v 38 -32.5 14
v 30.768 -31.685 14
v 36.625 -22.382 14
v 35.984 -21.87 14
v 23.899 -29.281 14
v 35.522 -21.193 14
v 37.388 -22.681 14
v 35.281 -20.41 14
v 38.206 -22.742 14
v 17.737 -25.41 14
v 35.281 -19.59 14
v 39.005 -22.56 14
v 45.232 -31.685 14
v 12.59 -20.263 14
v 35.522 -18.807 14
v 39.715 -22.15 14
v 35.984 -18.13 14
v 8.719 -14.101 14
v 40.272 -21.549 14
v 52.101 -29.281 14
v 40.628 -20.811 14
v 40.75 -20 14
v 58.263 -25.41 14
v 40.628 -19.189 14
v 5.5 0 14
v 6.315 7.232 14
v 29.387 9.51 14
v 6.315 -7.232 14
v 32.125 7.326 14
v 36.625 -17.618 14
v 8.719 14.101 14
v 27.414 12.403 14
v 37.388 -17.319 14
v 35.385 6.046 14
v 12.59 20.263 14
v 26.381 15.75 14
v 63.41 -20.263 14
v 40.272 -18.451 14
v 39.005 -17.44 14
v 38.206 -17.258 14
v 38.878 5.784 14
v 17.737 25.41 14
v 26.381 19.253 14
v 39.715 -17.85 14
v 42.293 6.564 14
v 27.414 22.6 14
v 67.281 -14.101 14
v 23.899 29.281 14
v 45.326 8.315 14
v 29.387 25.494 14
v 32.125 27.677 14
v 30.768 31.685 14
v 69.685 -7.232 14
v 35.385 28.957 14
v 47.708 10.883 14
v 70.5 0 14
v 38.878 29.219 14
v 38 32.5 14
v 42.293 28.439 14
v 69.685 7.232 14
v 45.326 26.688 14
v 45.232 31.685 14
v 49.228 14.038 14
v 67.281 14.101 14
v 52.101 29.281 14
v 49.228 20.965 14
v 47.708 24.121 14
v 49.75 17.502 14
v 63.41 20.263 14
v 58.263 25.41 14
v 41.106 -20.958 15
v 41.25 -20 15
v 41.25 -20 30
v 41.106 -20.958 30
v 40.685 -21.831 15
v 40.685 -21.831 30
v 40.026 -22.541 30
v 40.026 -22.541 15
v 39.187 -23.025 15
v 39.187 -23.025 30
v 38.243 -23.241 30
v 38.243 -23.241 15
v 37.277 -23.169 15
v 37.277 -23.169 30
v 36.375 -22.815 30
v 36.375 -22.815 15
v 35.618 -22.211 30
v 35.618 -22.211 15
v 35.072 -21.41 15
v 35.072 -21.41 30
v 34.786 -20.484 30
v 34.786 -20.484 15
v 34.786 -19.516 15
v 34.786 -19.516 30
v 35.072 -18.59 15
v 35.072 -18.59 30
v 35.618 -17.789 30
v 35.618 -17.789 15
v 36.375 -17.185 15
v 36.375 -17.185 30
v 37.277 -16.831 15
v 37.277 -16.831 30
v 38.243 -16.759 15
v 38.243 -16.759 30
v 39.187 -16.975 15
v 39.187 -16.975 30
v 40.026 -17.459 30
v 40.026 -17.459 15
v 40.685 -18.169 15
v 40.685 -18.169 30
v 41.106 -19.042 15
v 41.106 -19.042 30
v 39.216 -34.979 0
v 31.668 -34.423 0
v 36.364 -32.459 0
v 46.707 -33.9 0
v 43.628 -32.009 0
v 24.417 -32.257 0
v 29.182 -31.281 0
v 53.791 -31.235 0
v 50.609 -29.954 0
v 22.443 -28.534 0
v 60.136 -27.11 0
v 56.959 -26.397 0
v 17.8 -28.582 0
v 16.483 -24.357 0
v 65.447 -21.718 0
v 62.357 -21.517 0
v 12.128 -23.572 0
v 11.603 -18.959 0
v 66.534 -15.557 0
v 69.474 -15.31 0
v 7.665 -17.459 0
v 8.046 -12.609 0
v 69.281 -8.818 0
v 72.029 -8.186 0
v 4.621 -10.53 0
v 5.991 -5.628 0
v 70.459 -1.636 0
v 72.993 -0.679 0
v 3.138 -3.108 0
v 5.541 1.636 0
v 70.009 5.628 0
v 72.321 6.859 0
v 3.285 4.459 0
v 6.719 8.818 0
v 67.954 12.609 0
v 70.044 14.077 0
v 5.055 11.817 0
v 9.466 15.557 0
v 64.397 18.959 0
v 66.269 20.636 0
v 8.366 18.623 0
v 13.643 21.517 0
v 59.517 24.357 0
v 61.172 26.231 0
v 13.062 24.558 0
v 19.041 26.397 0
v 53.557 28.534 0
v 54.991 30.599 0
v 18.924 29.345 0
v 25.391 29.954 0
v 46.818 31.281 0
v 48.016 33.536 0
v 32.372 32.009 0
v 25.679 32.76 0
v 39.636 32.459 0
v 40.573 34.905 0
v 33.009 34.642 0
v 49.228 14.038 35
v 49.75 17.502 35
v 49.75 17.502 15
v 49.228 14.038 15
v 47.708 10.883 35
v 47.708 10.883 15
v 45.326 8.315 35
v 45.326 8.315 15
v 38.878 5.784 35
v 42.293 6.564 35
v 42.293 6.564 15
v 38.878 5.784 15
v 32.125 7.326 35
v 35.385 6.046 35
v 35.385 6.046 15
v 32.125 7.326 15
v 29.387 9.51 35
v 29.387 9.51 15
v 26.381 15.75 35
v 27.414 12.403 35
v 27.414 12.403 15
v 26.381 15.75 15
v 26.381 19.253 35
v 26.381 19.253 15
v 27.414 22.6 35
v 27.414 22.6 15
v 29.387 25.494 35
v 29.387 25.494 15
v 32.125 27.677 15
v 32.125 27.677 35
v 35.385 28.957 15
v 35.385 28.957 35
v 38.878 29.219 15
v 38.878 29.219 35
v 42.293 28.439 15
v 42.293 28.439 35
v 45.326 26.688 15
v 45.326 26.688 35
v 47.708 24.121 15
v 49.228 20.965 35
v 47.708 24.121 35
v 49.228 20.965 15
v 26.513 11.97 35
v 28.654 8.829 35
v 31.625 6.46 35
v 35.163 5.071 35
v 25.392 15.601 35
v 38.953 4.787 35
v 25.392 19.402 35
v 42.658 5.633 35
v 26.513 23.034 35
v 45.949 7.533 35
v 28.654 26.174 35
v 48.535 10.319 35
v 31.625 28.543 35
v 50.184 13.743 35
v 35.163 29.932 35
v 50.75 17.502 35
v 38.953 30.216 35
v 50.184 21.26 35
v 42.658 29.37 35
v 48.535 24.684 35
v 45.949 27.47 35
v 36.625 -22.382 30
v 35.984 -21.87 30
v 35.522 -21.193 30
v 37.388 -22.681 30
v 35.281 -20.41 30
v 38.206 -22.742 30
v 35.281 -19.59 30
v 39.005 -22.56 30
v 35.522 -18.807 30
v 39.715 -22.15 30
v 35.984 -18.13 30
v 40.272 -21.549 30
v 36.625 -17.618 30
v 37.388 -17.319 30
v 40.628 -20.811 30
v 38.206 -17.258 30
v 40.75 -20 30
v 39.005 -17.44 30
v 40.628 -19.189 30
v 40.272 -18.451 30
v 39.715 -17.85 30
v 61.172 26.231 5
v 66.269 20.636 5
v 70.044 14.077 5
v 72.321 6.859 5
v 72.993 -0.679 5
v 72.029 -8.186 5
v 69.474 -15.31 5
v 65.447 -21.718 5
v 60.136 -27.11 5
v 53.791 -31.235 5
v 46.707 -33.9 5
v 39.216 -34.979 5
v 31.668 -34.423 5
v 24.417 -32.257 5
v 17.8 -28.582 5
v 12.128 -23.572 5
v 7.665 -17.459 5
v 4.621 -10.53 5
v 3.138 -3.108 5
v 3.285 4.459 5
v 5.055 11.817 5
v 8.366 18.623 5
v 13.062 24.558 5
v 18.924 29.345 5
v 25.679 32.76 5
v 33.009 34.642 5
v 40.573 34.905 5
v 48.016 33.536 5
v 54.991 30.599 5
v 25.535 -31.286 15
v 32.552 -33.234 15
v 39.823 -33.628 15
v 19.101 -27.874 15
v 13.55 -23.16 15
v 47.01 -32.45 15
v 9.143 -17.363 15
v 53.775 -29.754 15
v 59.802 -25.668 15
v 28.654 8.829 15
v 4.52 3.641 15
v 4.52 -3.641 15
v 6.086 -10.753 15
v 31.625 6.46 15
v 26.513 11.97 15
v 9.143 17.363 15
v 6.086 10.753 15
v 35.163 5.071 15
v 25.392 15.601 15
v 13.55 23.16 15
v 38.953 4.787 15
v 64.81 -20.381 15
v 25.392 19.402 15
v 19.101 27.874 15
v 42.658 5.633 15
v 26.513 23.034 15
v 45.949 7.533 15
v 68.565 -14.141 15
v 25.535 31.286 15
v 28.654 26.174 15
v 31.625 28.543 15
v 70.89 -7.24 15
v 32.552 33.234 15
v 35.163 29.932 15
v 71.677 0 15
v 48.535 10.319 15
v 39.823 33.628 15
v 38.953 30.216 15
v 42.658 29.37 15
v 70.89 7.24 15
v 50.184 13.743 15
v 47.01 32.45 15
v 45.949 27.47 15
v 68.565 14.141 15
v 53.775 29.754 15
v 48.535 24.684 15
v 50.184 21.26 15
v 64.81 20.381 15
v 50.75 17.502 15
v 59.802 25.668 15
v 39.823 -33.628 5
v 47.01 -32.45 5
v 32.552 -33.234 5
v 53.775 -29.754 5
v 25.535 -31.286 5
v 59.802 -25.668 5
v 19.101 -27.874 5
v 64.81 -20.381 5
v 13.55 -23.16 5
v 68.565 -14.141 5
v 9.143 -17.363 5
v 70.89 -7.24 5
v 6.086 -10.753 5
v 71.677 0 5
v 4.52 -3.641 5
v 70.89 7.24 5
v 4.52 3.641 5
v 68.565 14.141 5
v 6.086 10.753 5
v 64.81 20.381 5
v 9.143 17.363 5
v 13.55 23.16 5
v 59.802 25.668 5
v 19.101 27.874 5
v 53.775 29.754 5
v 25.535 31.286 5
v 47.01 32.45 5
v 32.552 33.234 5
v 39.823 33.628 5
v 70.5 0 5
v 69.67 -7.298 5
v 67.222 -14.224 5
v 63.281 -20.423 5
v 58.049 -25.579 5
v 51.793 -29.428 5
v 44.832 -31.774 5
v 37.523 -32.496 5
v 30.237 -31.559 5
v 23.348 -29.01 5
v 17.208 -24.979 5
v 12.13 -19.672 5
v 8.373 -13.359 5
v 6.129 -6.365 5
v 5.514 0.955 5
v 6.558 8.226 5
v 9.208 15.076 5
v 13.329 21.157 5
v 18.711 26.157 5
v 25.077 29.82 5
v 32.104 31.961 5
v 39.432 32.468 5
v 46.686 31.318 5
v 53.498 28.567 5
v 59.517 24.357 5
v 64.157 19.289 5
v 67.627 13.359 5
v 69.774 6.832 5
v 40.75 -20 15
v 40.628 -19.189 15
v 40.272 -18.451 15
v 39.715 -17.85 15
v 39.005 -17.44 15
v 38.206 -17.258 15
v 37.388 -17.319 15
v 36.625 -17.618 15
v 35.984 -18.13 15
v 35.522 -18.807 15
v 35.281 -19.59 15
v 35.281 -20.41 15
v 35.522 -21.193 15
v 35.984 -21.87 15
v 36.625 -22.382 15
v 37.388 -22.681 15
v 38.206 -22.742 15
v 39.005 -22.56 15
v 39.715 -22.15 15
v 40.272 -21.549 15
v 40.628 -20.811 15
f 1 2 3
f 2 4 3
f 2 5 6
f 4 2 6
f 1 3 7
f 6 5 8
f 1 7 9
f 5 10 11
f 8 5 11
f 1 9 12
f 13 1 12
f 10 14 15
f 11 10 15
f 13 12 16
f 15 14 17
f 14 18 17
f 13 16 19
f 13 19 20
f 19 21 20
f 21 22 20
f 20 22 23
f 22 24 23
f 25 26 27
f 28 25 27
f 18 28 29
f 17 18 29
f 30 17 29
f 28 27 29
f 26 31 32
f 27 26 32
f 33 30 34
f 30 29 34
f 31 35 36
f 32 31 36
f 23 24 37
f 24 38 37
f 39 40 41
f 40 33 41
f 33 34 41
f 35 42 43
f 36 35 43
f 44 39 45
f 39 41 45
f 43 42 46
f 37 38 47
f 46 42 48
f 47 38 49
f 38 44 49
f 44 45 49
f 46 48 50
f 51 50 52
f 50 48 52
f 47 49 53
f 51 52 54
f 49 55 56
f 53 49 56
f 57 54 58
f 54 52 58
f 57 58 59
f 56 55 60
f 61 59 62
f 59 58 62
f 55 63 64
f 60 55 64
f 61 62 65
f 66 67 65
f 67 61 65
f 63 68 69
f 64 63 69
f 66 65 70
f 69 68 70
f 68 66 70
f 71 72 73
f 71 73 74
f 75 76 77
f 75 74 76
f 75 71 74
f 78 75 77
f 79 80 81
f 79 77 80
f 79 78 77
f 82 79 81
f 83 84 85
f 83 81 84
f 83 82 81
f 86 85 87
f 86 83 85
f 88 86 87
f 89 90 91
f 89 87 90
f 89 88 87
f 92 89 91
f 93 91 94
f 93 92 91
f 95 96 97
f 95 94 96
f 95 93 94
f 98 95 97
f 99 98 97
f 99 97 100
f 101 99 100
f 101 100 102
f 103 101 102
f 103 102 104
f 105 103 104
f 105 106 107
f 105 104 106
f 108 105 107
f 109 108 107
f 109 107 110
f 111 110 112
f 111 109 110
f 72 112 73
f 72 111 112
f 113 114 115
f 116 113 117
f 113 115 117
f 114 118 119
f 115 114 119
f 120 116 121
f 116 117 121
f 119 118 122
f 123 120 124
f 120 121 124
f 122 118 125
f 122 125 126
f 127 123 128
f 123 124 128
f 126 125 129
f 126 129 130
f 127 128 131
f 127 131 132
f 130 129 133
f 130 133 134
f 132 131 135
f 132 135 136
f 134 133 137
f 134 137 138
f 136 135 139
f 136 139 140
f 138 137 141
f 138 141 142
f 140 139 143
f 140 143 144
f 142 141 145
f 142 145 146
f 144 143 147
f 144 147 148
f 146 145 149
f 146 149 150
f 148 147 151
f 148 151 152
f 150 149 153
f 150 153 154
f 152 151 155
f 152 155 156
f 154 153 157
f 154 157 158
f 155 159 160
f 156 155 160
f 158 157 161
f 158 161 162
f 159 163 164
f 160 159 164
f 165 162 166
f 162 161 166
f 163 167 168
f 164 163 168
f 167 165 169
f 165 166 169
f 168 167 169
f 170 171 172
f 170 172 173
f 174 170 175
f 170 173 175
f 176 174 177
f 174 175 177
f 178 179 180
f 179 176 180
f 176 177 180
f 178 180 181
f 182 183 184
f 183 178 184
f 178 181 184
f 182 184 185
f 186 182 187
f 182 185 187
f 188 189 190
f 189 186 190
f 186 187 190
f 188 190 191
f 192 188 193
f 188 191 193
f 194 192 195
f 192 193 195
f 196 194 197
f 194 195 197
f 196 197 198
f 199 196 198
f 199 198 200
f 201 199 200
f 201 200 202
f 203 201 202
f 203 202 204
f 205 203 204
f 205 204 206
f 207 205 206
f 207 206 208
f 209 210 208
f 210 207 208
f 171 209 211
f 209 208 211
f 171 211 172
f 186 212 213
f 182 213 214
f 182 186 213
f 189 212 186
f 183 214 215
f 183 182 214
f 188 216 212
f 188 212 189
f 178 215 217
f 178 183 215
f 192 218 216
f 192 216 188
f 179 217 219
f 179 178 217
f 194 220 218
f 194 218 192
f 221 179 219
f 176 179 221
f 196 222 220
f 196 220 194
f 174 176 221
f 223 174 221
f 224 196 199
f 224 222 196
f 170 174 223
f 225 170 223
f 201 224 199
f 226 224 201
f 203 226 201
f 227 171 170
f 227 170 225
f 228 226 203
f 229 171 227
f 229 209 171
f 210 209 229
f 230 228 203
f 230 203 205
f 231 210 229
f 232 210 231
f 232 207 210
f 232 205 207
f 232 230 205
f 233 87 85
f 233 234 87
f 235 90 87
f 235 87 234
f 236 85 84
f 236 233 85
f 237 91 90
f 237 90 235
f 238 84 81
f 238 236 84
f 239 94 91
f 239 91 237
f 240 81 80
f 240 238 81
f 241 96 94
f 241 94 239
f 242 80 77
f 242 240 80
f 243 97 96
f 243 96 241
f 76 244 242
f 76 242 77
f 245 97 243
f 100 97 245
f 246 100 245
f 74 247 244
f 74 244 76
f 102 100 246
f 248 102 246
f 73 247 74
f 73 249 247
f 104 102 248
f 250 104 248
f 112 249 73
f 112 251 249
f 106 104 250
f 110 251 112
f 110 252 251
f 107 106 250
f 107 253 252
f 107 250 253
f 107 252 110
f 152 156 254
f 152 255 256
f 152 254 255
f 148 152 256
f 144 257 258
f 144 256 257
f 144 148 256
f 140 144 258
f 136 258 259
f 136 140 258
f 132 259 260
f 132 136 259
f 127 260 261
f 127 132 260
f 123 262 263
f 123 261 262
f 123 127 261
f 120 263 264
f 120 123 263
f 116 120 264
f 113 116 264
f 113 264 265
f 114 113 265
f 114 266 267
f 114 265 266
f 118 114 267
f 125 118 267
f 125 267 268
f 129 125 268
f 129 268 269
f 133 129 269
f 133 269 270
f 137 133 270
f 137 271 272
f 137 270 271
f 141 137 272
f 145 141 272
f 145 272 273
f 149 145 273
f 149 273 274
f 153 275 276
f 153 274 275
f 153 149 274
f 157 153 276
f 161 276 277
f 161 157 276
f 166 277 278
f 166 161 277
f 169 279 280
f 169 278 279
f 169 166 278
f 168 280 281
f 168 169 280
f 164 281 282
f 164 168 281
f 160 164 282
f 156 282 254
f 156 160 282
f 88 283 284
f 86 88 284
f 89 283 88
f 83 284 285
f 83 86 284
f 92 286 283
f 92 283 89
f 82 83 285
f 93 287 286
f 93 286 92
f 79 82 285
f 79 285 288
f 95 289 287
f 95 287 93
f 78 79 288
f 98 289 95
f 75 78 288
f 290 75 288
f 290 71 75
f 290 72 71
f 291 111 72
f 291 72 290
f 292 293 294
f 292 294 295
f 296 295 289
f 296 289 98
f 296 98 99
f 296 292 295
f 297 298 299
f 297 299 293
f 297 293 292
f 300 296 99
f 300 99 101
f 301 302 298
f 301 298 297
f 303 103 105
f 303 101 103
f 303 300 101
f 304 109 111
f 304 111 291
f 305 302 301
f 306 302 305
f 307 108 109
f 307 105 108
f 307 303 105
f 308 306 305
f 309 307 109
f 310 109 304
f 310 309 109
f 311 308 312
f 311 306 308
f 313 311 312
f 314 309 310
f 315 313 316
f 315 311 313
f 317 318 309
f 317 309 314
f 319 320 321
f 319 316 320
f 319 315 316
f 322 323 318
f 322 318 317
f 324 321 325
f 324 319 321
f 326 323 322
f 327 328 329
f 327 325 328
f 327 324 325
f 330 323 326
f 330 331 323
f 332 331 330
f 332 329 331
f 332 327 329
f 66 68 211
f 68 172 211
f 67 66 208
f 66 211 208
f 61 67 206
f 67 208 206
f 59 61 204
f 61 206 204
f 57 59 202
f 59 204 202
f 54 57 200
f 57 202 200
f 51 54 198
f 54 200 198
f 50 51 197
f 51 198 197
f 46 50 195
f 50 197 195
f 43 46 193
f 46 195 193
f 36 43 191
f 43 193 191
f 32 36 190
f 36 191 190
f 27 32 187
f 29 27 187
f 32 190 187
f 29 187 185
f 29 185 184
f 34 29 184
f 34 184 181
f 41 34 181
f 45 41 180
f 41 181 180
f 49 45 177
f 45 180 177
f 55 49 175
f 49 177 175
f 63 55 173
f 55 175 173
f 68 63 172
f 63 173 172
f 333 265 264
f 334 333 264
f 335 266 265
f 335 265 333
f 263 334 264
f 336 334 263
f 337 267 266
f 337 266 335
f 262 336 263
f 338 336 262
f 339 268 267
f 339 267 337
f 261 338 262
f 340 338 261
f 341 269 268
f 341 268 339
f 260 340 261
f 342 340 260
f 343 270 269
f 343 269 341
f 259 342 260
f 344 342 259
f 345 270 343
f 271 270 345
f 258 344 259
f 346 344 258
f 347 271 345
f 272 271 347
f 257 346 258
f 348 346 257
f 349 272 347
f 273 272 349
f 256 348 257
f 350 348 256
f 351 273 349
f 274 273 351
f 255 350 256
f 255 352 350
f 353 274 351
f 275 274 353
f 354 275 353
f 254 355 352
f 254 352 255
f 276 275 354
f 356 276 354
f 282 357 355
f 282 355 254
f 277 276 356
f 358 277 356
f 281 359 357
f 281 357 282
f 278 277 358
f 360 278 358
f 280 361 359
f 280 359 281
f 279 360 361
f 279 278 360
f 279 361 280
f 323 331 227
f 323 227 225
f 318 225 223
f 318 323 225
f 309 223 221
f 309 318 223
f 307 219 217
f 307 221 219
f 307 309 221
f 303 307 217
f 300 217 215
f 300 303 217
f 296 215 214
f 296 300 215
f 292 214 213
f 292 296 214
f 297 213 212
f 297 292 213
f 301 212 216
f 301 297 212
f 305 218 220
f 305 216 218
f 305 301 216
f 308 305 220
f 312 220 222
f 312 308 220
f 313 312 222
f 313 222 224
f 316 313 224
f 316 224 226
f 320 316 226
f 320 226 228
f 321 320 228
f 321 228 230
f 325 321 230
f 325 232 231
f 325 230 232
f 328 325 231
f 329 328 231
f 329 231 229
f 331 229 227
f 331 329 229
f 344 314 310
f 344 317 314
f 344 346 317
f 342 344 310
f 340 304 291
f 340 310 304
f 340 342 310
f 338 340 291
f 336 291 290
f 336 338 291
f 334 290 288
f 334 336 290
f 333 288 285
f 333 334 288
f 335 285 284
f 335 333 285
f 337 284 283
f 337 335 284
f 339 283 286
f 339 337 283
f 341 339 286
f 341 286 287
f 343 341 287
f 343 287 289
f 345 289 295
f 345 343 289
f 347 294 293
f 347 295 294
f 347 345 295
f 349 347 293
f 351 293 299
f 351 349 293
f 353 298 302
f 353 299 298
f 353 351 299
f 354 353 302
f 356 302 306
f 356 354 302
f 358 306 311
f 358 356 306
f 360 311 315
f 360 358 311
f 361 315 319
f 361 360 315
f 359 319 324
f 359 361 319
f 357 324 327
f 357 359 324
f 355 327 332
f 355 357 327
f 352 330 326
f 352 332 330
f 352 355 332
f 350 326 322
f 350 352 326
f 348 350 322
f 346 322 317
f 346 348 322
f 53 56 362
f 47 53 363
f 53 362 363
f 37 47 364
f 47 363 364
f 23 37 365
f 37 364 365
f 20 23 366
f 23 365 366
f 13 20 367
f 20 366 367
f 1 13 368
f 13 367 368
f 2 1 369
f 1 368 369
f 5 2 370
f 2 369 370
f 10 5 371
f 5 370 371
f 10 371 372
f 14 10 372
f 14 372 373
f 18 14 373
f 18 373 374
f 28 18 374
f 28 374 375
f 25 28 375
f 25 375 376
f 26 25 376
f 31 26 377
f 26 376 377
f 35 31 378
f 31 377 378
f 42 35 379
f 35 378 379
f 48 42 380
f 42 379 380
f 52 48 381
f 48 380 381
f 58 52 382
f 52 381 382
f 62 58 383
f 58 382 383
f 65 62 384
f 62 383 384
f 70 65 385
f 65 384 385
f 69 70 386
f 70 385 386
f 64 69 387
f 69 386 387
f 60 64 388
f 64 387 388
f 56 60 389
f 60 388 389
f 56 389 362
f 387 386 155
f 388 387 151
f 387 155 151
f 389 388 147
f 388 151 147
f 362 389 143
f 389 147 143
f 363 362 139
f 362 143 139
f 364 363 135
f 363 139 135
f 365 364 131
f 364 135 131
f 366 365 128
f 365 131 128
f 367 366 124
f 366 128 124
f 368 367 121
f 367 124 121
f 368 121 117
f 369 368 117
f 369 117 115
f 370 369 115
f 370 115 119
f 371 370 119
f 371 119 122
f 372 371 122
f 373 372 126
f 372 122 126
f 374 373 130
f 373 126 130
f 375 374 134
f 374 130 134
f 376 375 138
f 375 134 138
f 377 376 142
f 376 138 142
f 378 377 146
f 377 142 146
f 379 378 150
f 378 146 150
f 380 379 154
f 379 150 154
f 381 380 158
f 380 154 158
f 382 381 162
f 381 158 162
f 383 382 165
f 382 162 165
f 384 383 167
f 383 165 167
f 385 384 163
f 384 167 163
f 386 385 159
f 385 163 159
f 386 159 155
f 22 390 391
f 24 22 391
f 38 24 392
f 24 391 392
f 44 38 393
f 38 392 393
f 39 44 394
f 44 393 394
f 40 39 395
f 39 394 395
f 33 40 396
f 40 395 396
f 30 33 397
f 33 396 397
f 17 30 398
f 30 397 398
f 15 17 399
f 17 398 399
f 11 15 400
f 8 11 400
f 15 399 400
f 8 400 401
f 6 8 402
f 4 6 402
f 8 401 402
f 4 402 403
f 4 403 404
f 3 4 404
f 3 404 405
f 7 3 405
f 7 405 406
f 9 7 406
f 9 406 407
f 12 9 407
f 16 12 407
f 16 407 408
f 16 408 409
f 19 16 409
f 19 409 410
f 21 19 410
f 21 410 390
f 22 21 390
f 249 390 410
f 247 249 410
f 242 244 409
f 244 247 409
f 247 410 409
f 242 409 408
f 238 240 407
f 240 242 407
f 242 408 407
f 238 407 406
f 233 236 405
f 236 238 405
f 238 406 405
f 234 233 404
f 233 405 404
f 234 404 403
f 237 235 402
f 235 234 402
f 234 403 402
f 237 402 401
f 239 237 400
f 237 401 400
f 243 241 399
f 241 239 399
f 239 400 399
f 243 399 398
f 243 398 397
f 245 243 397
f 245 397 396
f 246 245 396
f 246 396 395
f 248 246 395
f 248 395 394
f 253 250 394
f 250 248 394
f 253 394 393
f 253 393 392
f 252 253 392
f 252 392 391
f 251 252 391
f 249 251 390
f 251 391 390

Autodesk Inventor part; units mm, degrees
ref_plane "YZ Plane" through (0, 0, 0) normal (1, 0, 0) x (0, 1, 0)
ref_plane "XZ Plane" through (0, 0, 0) normal (0, 1, 0) x (-1, 0, 0)
ref_plane "XY Plane" through (0, 0, 0) normal (0, 0, 1) x (1, 0, 0)
ref_plane "Plano de trabalho1" through (12.8418, -28.4792, 0) normal (0, 0, 1) x (0.6621, 0.7495, 0)
sketch "Esboço1" plane through (12.8418, -28.4792, 0) normal (0, 0, 1) x (0.6621, 0.7495, 0)
  circle A0 centre (38, 0) radius 32.5 projected
  circle A1 centre (38, 0) radius 35
  point P0 (12.8418, 28.4792)
  dimension "d0" = 70
extrude "Extrusão1" add sketch "Esboço1" along normal blind 5
sketch "Esboço2" plane through (38, 0, 5) normal (0, 0, 1) x (1, 0, 0)
  circle A0 centre (0, 0) radius 34.6774 projected
  circle A1 centre (0, 0) radius 32.5 projected
  circle A2 centre (0, 0) radius 33.6774
  point P0 (-38, 0)
  dimension "d3" = 1
extrude "Extrusão2" add sketch "Esboço2" along normal blind 10 contours A2
sketch "Esboço3" plane through (38, 0, 15) normal (0, 0, 1) x (1, 0, 0)
  circle A0 centre (0, 0) radius 32.5 projected
  point P0 (-38, 0)
extrude "Extrusão3" add sketch "Esboço3" against normal blind 1
sketch "Esboço4" plane through (38, 0, 15) normal (0, 0, 1) x (1, 0, 0)
  circle A0 centre (0, 0) radius 33.6774 projected
  circle A1 centre (0, 17.5016) radius 12.75
  circle A2 centre (0, 17.5016) radius 11.75
  point P0 (-38, 0)
  dimension "d8" = 25.5
  dimension "d9" = 1
extrude "Extrusão4" add sketch "Esboço4" along normal blind 20 contours A1
sketch "Esboço5" plane through (38, 0, 15) normal (0, 0, 1) x (1, 0, 0)
  circle A0 centre (0, 0) radius 33.6774 projected
  circle A1 centre (0, 17.5016) radius 12.75 projected
  circle A2 centre (0, -20) radius 3.25
  circle A3 centre (0, -20) radius 2.75
  point P0 (-38, 0)
  dimension "d12" = 6.5
  dimension "d14" = 0.5
  dimension "d15" = 20
extrude "Extrusão5" add sketch "Esboço5" along normal blind 15 contours A2
sketch "Esboço6" plane through (38, 0, 15) normal (0, 0, 1) x (1, 0, 0)
  circle A0 centre (0, -20) radius 2.75 projected
  circle A1 centre (0, 17.5016) radius 11.75 projected
  point P0 (-38, 0)
extrude "Extrusão6" cut sketch "Esboço6" against normal blind 15
properties part number "Tampa de Entrada"
